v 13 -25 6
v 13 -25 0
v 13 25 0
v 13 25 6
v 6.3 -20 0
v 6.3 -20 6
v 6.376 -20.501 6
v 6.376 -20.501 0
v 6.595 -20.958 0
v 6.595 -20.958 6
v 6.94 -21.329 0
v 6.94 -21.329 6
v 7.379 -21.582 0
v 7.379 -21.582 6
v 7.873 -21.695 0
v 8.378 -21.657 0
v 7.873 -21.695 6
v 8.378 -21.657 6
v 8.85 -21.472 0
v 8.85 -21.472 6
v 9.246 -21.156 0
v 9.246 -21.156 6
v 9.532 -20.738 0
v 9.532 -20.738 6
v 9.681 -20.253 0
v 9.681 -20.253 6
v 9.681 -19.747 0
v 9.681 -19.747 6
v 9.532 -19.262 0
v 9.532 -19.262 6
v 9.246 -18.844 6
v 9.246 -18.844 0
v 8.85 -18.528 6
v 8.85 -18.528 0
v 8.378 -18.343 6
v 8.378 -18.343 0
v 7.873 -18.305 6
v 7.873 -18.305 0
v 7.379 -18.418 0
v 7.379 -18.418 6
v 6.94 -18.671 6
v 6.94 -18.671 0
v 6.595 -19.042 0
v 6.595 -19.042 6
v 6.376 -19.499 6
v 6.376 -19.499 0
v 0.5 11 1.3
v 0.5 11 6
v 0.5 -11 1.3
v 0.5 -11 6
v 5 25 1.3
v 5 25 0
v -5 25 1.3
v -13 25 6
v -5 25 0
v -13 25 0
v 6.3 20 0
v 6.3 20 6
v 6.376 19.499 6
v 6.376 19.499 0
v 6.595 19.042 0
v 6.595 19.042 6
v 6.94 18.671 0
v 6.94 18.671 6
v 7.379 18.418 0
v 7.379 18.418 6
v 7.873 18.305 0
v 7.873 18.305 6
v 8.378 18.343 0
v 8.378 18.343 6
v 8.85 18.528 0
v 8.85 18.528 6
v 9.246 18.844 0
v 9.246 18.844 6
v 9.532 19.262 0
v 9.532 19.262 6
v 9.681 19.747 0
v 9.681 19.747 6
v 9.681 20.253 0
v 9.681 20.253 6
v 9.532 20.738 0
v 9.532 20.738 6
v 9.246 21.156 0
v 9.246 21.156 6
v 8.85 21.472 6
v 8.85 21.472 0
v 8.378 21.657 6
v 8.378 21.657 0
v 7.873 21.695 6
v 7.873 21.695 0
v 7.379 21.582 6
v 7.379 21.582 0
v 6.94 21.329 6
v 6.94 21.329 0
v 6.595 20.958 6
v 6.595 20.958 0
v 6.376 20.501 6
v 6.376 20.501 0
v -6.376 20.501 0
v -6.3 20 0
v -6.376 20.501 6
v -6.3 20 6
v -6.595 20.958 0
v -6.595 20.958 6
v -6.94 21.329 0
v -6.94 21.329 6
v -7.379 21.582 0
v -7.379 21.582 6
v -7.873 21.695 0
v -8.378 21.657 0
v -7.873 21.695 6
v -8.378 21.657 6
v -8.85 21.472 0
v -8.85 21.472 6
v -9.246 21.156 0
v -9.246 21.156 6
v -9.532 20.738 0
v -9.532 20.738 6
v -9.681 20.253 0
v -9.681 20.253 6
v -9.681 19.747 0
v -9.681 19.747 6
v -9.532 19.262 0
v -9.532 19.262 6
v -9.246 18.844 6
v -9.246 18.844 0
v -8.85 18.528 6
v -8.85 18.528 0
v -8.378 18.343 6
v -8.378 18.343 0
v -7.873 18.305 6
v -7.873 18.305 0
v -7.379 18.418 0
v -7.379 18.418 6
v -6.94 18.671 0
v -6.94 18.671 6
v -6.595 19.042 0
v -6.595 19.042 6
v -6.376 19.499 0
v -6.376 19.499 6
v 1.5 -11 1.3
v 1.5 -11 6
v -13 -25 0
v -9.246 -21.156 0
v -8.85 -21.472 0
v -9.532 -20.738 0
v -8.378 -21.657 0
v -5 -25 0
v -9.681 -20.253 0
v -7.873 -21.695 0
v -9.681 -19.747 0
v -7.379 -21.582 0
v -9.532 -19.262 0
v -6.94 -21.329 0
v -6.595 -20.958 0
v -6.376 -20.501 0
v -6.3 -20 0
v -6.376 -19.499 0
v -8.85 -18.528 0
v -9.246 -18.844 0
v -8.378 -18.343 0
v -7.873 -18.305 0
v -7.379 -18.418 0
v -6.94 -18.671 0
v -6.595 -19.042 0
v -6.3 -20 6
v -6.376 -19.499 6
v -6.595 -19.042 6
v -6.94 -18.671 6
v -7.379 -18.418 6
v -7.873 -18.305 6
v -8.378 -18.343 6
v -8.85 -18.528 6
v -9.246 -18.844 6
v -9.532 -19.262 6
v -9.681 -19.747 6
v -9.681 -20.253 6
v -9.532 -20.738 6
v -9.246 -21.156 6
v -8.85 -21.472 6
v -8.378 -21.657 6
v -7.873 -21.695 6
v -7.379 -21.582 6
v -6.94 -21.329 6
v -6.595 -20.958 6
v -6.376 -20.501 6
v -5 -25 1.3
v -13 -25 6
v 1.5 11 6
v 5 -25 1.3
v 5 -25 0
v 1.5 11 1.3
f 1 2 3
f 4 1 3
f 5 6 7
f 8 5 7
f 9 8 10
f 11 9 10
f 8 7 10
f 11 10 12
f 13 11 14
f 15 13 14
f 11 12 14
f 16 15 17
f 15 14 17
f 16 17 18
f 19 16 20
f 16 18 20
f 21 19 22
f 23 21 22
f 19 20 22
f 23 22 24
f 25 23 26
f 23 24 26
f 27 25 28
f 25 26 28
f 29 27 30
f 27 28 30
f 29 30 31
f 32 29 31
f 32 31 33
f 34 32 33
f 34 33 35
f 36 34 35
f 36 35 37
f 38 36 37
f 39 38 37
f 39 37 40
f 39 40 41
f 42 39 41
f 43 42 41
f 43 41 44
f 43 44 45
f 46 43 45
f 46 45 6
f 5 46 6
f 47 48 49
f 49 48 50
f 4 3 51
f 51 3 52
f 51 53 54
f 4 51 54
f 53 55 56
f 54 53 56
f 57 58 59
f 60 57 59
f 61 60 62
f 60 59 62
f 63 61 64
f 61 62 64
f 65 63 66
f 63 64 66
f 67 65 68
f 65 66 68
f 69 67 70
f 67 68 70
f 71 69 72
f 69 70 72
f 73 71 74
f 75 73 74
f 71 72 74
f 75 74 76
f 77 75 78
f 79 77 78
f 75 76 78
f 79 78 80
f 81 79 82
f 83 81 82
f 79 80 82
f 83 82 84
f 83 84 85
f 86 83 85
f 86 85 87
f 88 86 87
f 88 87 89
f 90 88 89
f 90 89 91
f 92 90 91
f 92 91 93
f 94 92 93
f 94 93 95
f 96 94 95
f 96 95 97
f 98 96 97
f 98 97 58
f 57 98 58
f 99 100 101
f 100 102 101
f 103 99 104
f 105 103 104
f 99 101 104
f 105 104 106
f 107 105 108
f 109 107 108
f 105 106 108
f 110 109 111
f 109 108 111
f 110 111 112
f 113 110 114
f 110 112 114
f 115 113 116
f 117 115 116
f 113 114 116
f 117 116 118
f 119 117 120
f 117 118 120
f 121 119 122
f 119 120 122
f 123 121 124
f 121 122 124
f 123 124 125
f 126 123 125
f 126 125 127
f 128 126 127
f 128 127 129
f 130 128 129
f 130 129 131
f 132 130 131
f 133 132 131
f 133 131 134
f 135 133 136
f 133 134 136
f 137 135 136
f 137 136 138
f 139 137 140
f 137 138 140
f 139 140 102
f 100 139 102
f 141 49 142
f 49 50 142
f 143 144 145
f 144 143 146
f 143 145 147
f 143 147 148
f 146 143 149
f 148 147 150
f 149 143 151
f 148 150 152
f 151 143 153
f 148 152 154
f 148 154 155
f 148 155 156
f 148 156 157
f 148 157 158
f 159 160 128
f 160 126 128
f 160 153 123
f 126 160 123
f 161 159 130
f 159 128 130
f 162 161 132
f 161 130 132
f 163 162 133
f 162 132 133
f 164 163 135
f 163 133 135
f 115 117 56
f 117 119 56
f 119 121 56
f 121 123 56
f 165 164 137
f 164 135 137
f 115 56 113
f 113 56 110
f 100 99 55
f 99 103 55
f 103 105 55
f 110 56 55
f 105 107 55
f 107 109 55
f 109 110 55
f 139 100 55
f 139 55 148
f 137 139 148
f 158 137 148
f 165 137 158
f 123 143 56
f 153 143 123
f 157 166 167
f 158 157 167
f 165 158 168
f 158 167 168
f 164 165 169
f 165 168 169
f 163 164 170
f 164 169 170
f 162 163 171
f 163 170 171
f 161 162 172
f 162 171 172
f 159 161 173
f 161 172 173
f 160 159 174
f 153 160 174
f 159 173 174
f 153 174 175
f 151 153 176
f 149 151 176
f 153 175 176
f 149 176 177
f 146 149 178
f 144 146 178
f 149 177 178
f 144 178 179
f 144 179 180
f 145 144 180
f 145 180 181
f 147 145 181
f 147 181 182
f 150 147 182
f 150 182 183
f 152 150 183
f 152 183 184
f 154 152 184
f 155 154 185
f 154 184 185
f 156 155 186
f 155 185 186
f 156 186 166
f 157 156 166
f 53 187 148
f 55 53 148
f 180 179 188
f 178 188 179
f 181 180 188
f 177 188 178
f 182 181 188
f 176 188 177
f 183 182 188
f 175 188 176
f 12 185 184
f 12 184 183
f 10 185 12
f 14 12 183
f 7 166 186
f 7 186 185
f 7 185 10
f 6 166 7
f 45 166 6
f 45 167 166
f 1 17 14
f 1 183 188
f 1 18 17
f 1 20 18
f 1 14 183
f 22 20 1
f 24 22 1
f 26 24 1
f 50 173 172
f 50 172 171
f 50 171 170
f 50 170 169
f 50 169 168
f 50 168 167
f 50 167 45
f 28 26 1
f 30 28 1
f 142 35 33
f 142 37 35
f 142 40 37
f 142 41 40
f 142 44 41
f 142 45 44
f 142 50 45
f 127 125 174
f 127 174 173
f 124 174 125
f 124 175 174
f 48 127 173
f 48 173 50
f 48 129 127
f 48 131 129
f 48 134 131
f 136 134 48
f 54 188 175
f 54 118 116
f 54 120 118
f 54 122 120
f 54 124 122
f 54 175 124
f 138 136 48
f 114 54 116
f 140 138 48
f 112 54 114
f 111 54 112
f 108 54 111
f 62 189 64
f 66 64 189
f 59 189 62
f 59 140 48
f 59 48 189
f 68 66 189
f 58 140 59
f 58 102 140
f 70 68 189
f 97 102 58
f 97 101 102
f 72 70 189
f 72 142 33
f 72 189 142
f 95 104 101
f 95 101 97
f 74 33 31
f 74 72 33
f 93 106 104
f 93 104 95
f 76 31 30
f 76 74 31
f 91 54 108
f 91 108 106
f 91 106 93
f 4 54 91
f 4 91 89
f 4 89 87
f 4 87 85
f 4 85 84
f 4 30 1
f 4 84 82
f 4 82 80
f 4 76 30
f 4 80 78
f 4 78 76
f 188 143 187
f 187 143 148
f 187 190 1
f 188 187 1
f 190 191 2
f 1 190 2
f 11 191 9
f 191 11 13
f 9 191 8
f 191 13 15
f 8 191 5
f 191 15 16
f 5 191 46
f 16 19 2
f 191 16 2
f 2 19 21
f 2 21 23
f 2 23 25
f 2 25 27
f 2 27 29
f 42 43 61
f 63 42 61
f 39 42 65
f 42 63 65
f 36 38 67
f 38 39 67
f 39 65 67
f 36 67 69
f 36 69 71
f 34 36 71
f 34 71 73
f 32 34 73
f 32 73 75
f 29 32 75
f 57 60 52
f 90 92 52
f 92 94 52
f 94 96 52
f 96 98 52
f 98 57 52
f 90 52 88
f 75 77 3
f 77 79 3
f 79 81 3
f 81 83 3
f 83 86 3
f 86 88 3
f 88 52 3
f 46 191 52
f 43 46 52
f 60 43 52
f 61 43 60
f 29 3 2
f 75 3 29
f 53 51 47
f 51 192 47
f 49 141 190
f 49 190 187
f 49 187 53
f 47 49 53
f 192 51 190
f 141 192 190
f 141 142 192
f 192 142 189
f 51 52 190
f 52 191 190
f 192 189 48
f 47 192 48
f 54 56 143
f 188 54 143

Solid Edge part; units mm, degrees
sketch "Sketch1" plane through (0, 0, 0) normal (0, 0, 1) x (1, 0, 0)
  line L0 (-13, -25) -> (13, -25)
  line L1 (13, -25) -> (13, 25)
  line L2 (13, 25) -> (-13, 25)
  line L3 (-13, 25) -> (-13, -25)
  dimension "D1" = 26
  dimension "D2" = 50
extrude "Protrusion1" add sketch "Sketch1" along normal blind 6
sketch "Sketch2" plane through (0, -25, 3) normal (0, -1, 0) x (1, 0, 0)
  line L0 (-5, -3) -> (5, -3)
  line L1 (5, -3) -> (5, -1.7)
  line L2 (5, -1.7) -> (-5, -1.7)
  line L3 (-5, -1.7) -> (-5, -3)
  dimension "D1" = 10
  dimension "D2" = 1.3
extrude "Cutout1" cut sketch "Sketch2" against normal through all
sketch "Sketch3" plane through (0, 0, 6) normal (0, 0, 1) x (1, 0, 0)
  circle A0 centre (-8, 20) radius 1.7
  dimension "D1" = 7
  dimension "D2" = 8
  dimension "D3" = 5
extrude "Cutout2" cut sketch "Sketch3" against normal through all
mirror "Mirror1" about plane through (0, 0, 0) normal (1, 0, 0) of "Cutout2"
mirror "Mirror2" about plane through (0, 0, 0) normal (0, -1, 0) of "Cutout2", "Mirror1"
sketch "Sketch4" plane through (0, 0, 6) normal (0, 0, 1) x (1, 0, 0)
  line L0 (0.5, -11) -> (1.5, -11)
  line L1 (1.5, -11) -> (1.5, 11)
  line L2 (1.5, 11) -> (0.5, 11)
  line L3 (0.5, 11) -> (0.5, -11)
  dimension "D1" = 1
  dimension "D2" = 22
  dimension "D3" = 4
extrude "Cutout3" cut sketch "Sketch4" against normal through all
